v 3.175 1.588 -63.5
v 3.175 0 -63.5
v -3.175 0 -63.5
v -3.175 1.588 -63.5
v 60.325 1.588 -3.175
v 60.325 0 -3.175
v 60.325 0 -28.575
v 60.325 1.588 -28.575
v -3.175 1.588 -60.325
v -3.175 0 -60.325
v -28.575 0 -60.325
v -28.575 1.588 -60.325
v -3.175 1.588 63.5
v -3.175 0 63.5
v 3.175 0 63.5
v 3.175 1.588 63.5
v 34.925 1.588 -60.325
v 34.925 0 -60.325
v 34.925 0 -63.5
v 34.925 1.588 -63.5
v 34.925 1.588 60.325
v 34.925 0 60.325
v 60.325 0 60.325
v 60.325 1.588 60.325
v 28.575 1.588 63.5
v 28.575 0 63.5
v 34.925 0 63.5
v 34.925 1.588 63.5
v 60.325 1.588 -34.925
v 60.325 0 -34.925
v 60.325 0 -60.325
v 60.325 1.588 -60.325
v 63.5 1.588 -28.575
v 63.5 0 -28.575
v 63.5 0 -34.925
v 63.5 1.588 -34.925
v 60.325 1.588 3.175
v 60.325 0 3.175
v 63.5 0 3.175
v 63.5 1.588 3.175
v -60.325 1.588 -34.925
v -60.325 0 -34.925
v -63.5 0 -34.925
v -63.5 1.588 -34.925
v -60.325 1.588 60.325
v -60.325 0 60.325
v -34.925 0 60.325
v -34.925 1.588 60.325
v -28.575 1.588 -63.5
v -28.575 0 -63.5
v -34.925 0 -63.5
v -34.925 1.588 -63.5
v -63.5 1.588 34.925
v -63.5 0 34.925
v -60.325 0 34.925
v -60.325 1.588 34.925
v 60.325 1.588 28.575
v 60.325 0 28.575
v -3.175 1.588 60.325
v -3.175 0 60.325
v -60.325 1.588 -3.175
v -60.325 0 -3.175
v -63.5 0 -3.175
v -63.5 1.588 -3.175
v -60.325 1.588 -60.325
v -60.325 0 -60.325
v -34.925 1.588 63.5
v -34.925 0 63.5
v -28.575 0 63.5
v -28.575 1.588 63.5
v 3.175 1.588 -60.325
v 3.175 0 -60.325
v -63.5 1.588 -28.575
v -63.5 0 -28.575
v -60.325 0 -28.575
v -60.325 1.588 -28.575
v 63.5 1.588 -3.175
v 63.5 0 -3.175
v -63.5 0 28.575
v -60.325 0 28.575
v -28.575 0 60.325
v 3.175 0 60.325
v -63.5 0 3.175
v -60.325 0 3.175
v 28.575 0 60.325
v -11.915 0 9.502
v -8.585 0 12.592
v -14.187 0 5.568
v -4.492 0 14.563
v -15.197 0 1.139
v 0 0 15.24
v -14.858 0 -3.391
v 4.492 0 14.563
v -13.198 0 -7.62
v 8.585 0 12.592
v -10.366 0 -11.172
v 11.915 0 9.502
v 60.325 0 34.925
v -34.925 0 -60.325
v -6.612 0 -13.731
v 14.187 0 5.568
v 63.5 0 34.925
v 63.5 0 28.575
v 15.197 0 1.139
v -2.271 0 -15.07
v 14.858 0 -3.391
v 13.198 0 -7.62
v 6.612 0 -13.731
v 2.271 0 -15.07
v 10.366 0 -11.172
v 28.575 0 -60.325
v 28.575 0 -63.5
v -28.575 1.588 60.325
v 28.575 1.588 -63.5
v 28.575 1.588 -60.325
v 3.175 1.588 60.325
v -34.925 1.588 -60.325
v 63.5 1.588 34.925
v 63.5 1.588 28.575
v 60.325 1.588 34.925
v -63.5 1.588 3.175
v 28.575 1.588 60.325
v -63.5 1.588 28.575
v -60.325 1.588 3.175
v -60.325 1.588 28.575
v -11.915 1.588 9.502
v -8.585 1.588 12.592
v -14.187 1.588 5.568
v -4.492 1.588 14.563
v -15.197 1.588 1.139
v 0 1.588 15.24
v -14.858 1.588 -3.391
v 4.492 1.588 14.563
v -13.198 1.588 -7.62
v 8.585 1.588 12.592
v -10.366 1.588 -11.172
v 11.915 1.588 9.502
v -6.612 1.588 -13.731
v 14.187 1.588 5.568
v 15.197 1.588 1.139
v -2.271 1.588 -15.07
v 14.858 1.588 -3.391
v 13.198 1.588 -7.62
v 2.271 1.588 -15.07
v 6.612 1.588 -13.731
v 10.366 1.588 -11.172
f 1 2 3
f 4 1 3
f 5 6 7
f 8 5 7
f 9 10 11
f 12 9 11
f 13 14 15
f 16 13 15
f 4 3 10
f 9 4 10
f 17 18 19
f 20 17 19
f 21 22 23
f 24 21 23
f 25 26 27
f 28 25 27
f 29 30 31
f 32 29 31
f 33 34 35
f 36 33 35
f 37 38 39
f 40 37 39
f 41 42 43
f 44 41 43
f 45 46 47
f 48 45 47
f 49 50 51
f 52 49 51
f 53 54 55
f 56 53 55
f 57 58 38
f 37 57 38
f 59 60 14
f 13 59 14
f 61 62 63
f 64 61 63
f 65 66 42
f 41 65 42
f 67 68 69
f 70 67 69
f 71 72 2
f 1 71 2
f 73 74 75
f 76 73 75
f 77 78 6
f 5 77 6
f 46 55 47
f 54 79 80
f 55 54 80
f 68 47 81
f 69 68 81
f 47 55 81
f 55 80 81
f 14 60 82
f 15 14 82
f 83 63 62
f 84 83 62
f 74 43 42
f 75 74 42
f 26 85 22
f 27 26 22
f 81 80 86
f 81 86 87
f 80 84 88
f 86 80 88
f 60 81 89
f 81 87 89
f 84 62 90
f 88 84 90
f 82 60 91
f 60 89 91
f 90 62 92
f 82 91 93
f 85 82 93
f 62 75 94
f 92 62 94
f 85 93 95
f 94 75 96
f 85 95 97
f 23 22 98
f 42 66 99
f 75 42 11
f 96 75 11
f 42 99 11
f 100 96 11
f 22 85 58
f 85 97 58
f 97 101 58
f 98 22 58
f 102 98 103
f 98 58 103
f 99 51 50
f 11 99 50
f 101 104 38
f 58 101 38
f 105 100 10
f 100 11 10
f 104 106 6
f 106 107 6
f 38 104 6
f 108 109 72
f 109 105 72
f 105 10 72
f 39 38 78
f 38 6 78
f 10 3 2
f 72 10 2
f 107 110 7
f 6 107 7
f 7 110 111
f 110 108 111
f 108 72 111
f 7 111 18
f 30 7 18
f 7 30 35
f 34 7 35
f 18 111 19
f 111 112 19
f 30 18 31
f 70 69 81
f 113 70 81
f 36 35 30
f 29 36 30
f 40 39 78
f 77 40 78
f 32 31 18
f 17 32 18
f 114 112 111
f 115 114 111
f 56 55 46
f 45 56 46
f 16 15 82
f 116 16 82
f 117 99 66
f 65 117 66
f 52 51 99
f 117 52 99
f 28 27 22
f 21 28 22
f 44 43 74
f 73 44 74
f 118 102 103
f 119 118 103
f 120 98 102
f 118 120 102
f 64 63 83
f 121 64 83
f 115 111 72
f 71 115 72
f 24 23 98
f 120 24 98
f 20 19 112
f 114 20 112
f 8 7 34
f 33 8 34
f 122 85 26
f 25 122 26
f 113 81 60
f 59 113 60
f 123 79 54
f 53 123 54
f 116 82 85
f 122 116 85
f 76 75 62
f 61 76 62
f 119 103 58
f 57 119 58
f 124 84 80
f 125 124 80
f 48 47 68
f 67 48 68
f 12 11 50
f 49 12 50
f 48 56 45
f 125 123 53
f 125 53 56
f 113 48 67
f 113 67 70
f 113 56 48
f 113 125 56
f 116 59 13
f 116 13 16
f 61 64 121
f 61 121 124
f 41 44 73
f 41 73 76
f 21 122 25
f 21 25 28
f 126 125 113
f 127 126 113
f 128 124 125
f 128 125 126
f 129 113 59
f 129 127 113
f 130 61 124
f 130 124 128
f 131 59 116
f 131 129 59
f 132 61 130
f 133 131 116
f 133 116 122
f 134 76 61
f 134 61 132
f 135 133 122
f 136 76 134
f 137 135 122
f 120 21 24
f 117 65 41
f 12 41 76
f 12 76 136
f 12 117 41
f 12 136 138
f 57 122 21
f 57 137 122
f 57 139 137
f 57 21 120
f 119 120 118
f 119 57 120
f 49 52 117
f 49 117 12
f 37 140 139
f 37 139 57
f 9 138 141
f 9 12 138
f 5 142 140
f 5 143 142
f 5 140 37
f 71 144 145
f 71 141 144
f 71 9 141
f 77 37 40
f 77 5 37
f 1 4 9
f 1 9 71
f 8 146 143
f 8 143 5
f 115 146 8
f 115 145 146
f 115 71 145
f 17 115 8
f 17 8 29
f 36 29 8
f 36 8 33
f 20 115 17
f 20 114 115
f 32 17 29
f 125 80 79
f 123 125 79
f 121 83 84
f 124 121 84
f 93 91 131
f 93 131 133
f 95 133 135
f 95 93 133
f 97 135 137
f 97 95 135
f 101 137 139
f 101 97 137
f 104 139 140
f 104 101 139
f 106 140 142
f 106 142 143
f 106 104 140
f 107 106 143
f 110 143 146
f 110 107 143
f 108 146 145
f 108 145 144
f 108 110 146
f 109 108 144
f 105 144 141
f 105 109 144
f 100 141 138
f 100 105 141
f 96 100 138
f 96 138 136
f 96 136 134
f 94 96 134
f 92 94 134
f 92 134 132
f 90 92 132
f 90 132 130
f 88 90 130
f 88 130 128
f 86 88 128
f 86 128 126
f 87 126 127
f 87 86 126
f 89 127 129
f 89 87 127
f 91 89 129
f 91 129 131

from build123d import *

# Parameters (mm, degrees)
SKETCH1_R           = 15.24
BOSS_EXTRUDE1_DEPTH = 1.5875


with BuildPart() as part:
    # Sketch1 → Boss-Extrude1 (new body)
    with BuildSketch(Plane(origin=(0, 0, 0), x_dir=(1, 0, 0), z_dir=(0, 1, 0))):
        Polygon((3.175, 63.5), (-3.175, 63.5), (-3.175, 60.325), (-28.575, 60.325), (-28.575, 63.5), (-34.925, 63.5), (-34.925, 60.325), (-60.325, 60.325), (-60.325, 34.925), (-63.5, 34.925), (-63.5, 28.575), (-60.325, 28.575), (-60.325, 3.175), (-63.5, 3.175), (-63.5, -3.175), (-60.325, -3.175), (-60.325, -28.575), (-63.5, -28.575), (-63.5, -34.925), (-60.325, -34.925), (-60.325, -60.325), (-34.925, -60.325), (-34.925, -63.5), (-28.575, -63.5), (-28.575, -60.325), (-3.175, -60.325), (-3.175, -63.5), (3.175, -63.5), (3.175, -60.325), (28.575, -60.325), (28.575, -63.5), (34.925, -63.5), (34.925, -60.325), (60.325, -60.325), (60.325, -34.925), (63.5, -34.925), (63.5, -28.575), (60.325, -28.575), (60.325, -3.175), (63.5, -3.175), (63.5, 3.175), (60.325, 3.175), (60.325, 28.575), (63.5, 28.575), (63.5, 34.925), (60.325, 34.925), (60.325, 60.325), (34.925, 60.325), (34.925, 63.5), (28.575, 63.5), (28.575, 60.325), (3.175, 60.325), align=None)
        with Locations(Location((0, 0, 0), (0, 0, 270))):
            Circle(SKETCH1_R, mode=Mode.SUBTRACT)
    extrude(amount=BOSS_EXTRUDE1_DEPTH)


solid = part.part
